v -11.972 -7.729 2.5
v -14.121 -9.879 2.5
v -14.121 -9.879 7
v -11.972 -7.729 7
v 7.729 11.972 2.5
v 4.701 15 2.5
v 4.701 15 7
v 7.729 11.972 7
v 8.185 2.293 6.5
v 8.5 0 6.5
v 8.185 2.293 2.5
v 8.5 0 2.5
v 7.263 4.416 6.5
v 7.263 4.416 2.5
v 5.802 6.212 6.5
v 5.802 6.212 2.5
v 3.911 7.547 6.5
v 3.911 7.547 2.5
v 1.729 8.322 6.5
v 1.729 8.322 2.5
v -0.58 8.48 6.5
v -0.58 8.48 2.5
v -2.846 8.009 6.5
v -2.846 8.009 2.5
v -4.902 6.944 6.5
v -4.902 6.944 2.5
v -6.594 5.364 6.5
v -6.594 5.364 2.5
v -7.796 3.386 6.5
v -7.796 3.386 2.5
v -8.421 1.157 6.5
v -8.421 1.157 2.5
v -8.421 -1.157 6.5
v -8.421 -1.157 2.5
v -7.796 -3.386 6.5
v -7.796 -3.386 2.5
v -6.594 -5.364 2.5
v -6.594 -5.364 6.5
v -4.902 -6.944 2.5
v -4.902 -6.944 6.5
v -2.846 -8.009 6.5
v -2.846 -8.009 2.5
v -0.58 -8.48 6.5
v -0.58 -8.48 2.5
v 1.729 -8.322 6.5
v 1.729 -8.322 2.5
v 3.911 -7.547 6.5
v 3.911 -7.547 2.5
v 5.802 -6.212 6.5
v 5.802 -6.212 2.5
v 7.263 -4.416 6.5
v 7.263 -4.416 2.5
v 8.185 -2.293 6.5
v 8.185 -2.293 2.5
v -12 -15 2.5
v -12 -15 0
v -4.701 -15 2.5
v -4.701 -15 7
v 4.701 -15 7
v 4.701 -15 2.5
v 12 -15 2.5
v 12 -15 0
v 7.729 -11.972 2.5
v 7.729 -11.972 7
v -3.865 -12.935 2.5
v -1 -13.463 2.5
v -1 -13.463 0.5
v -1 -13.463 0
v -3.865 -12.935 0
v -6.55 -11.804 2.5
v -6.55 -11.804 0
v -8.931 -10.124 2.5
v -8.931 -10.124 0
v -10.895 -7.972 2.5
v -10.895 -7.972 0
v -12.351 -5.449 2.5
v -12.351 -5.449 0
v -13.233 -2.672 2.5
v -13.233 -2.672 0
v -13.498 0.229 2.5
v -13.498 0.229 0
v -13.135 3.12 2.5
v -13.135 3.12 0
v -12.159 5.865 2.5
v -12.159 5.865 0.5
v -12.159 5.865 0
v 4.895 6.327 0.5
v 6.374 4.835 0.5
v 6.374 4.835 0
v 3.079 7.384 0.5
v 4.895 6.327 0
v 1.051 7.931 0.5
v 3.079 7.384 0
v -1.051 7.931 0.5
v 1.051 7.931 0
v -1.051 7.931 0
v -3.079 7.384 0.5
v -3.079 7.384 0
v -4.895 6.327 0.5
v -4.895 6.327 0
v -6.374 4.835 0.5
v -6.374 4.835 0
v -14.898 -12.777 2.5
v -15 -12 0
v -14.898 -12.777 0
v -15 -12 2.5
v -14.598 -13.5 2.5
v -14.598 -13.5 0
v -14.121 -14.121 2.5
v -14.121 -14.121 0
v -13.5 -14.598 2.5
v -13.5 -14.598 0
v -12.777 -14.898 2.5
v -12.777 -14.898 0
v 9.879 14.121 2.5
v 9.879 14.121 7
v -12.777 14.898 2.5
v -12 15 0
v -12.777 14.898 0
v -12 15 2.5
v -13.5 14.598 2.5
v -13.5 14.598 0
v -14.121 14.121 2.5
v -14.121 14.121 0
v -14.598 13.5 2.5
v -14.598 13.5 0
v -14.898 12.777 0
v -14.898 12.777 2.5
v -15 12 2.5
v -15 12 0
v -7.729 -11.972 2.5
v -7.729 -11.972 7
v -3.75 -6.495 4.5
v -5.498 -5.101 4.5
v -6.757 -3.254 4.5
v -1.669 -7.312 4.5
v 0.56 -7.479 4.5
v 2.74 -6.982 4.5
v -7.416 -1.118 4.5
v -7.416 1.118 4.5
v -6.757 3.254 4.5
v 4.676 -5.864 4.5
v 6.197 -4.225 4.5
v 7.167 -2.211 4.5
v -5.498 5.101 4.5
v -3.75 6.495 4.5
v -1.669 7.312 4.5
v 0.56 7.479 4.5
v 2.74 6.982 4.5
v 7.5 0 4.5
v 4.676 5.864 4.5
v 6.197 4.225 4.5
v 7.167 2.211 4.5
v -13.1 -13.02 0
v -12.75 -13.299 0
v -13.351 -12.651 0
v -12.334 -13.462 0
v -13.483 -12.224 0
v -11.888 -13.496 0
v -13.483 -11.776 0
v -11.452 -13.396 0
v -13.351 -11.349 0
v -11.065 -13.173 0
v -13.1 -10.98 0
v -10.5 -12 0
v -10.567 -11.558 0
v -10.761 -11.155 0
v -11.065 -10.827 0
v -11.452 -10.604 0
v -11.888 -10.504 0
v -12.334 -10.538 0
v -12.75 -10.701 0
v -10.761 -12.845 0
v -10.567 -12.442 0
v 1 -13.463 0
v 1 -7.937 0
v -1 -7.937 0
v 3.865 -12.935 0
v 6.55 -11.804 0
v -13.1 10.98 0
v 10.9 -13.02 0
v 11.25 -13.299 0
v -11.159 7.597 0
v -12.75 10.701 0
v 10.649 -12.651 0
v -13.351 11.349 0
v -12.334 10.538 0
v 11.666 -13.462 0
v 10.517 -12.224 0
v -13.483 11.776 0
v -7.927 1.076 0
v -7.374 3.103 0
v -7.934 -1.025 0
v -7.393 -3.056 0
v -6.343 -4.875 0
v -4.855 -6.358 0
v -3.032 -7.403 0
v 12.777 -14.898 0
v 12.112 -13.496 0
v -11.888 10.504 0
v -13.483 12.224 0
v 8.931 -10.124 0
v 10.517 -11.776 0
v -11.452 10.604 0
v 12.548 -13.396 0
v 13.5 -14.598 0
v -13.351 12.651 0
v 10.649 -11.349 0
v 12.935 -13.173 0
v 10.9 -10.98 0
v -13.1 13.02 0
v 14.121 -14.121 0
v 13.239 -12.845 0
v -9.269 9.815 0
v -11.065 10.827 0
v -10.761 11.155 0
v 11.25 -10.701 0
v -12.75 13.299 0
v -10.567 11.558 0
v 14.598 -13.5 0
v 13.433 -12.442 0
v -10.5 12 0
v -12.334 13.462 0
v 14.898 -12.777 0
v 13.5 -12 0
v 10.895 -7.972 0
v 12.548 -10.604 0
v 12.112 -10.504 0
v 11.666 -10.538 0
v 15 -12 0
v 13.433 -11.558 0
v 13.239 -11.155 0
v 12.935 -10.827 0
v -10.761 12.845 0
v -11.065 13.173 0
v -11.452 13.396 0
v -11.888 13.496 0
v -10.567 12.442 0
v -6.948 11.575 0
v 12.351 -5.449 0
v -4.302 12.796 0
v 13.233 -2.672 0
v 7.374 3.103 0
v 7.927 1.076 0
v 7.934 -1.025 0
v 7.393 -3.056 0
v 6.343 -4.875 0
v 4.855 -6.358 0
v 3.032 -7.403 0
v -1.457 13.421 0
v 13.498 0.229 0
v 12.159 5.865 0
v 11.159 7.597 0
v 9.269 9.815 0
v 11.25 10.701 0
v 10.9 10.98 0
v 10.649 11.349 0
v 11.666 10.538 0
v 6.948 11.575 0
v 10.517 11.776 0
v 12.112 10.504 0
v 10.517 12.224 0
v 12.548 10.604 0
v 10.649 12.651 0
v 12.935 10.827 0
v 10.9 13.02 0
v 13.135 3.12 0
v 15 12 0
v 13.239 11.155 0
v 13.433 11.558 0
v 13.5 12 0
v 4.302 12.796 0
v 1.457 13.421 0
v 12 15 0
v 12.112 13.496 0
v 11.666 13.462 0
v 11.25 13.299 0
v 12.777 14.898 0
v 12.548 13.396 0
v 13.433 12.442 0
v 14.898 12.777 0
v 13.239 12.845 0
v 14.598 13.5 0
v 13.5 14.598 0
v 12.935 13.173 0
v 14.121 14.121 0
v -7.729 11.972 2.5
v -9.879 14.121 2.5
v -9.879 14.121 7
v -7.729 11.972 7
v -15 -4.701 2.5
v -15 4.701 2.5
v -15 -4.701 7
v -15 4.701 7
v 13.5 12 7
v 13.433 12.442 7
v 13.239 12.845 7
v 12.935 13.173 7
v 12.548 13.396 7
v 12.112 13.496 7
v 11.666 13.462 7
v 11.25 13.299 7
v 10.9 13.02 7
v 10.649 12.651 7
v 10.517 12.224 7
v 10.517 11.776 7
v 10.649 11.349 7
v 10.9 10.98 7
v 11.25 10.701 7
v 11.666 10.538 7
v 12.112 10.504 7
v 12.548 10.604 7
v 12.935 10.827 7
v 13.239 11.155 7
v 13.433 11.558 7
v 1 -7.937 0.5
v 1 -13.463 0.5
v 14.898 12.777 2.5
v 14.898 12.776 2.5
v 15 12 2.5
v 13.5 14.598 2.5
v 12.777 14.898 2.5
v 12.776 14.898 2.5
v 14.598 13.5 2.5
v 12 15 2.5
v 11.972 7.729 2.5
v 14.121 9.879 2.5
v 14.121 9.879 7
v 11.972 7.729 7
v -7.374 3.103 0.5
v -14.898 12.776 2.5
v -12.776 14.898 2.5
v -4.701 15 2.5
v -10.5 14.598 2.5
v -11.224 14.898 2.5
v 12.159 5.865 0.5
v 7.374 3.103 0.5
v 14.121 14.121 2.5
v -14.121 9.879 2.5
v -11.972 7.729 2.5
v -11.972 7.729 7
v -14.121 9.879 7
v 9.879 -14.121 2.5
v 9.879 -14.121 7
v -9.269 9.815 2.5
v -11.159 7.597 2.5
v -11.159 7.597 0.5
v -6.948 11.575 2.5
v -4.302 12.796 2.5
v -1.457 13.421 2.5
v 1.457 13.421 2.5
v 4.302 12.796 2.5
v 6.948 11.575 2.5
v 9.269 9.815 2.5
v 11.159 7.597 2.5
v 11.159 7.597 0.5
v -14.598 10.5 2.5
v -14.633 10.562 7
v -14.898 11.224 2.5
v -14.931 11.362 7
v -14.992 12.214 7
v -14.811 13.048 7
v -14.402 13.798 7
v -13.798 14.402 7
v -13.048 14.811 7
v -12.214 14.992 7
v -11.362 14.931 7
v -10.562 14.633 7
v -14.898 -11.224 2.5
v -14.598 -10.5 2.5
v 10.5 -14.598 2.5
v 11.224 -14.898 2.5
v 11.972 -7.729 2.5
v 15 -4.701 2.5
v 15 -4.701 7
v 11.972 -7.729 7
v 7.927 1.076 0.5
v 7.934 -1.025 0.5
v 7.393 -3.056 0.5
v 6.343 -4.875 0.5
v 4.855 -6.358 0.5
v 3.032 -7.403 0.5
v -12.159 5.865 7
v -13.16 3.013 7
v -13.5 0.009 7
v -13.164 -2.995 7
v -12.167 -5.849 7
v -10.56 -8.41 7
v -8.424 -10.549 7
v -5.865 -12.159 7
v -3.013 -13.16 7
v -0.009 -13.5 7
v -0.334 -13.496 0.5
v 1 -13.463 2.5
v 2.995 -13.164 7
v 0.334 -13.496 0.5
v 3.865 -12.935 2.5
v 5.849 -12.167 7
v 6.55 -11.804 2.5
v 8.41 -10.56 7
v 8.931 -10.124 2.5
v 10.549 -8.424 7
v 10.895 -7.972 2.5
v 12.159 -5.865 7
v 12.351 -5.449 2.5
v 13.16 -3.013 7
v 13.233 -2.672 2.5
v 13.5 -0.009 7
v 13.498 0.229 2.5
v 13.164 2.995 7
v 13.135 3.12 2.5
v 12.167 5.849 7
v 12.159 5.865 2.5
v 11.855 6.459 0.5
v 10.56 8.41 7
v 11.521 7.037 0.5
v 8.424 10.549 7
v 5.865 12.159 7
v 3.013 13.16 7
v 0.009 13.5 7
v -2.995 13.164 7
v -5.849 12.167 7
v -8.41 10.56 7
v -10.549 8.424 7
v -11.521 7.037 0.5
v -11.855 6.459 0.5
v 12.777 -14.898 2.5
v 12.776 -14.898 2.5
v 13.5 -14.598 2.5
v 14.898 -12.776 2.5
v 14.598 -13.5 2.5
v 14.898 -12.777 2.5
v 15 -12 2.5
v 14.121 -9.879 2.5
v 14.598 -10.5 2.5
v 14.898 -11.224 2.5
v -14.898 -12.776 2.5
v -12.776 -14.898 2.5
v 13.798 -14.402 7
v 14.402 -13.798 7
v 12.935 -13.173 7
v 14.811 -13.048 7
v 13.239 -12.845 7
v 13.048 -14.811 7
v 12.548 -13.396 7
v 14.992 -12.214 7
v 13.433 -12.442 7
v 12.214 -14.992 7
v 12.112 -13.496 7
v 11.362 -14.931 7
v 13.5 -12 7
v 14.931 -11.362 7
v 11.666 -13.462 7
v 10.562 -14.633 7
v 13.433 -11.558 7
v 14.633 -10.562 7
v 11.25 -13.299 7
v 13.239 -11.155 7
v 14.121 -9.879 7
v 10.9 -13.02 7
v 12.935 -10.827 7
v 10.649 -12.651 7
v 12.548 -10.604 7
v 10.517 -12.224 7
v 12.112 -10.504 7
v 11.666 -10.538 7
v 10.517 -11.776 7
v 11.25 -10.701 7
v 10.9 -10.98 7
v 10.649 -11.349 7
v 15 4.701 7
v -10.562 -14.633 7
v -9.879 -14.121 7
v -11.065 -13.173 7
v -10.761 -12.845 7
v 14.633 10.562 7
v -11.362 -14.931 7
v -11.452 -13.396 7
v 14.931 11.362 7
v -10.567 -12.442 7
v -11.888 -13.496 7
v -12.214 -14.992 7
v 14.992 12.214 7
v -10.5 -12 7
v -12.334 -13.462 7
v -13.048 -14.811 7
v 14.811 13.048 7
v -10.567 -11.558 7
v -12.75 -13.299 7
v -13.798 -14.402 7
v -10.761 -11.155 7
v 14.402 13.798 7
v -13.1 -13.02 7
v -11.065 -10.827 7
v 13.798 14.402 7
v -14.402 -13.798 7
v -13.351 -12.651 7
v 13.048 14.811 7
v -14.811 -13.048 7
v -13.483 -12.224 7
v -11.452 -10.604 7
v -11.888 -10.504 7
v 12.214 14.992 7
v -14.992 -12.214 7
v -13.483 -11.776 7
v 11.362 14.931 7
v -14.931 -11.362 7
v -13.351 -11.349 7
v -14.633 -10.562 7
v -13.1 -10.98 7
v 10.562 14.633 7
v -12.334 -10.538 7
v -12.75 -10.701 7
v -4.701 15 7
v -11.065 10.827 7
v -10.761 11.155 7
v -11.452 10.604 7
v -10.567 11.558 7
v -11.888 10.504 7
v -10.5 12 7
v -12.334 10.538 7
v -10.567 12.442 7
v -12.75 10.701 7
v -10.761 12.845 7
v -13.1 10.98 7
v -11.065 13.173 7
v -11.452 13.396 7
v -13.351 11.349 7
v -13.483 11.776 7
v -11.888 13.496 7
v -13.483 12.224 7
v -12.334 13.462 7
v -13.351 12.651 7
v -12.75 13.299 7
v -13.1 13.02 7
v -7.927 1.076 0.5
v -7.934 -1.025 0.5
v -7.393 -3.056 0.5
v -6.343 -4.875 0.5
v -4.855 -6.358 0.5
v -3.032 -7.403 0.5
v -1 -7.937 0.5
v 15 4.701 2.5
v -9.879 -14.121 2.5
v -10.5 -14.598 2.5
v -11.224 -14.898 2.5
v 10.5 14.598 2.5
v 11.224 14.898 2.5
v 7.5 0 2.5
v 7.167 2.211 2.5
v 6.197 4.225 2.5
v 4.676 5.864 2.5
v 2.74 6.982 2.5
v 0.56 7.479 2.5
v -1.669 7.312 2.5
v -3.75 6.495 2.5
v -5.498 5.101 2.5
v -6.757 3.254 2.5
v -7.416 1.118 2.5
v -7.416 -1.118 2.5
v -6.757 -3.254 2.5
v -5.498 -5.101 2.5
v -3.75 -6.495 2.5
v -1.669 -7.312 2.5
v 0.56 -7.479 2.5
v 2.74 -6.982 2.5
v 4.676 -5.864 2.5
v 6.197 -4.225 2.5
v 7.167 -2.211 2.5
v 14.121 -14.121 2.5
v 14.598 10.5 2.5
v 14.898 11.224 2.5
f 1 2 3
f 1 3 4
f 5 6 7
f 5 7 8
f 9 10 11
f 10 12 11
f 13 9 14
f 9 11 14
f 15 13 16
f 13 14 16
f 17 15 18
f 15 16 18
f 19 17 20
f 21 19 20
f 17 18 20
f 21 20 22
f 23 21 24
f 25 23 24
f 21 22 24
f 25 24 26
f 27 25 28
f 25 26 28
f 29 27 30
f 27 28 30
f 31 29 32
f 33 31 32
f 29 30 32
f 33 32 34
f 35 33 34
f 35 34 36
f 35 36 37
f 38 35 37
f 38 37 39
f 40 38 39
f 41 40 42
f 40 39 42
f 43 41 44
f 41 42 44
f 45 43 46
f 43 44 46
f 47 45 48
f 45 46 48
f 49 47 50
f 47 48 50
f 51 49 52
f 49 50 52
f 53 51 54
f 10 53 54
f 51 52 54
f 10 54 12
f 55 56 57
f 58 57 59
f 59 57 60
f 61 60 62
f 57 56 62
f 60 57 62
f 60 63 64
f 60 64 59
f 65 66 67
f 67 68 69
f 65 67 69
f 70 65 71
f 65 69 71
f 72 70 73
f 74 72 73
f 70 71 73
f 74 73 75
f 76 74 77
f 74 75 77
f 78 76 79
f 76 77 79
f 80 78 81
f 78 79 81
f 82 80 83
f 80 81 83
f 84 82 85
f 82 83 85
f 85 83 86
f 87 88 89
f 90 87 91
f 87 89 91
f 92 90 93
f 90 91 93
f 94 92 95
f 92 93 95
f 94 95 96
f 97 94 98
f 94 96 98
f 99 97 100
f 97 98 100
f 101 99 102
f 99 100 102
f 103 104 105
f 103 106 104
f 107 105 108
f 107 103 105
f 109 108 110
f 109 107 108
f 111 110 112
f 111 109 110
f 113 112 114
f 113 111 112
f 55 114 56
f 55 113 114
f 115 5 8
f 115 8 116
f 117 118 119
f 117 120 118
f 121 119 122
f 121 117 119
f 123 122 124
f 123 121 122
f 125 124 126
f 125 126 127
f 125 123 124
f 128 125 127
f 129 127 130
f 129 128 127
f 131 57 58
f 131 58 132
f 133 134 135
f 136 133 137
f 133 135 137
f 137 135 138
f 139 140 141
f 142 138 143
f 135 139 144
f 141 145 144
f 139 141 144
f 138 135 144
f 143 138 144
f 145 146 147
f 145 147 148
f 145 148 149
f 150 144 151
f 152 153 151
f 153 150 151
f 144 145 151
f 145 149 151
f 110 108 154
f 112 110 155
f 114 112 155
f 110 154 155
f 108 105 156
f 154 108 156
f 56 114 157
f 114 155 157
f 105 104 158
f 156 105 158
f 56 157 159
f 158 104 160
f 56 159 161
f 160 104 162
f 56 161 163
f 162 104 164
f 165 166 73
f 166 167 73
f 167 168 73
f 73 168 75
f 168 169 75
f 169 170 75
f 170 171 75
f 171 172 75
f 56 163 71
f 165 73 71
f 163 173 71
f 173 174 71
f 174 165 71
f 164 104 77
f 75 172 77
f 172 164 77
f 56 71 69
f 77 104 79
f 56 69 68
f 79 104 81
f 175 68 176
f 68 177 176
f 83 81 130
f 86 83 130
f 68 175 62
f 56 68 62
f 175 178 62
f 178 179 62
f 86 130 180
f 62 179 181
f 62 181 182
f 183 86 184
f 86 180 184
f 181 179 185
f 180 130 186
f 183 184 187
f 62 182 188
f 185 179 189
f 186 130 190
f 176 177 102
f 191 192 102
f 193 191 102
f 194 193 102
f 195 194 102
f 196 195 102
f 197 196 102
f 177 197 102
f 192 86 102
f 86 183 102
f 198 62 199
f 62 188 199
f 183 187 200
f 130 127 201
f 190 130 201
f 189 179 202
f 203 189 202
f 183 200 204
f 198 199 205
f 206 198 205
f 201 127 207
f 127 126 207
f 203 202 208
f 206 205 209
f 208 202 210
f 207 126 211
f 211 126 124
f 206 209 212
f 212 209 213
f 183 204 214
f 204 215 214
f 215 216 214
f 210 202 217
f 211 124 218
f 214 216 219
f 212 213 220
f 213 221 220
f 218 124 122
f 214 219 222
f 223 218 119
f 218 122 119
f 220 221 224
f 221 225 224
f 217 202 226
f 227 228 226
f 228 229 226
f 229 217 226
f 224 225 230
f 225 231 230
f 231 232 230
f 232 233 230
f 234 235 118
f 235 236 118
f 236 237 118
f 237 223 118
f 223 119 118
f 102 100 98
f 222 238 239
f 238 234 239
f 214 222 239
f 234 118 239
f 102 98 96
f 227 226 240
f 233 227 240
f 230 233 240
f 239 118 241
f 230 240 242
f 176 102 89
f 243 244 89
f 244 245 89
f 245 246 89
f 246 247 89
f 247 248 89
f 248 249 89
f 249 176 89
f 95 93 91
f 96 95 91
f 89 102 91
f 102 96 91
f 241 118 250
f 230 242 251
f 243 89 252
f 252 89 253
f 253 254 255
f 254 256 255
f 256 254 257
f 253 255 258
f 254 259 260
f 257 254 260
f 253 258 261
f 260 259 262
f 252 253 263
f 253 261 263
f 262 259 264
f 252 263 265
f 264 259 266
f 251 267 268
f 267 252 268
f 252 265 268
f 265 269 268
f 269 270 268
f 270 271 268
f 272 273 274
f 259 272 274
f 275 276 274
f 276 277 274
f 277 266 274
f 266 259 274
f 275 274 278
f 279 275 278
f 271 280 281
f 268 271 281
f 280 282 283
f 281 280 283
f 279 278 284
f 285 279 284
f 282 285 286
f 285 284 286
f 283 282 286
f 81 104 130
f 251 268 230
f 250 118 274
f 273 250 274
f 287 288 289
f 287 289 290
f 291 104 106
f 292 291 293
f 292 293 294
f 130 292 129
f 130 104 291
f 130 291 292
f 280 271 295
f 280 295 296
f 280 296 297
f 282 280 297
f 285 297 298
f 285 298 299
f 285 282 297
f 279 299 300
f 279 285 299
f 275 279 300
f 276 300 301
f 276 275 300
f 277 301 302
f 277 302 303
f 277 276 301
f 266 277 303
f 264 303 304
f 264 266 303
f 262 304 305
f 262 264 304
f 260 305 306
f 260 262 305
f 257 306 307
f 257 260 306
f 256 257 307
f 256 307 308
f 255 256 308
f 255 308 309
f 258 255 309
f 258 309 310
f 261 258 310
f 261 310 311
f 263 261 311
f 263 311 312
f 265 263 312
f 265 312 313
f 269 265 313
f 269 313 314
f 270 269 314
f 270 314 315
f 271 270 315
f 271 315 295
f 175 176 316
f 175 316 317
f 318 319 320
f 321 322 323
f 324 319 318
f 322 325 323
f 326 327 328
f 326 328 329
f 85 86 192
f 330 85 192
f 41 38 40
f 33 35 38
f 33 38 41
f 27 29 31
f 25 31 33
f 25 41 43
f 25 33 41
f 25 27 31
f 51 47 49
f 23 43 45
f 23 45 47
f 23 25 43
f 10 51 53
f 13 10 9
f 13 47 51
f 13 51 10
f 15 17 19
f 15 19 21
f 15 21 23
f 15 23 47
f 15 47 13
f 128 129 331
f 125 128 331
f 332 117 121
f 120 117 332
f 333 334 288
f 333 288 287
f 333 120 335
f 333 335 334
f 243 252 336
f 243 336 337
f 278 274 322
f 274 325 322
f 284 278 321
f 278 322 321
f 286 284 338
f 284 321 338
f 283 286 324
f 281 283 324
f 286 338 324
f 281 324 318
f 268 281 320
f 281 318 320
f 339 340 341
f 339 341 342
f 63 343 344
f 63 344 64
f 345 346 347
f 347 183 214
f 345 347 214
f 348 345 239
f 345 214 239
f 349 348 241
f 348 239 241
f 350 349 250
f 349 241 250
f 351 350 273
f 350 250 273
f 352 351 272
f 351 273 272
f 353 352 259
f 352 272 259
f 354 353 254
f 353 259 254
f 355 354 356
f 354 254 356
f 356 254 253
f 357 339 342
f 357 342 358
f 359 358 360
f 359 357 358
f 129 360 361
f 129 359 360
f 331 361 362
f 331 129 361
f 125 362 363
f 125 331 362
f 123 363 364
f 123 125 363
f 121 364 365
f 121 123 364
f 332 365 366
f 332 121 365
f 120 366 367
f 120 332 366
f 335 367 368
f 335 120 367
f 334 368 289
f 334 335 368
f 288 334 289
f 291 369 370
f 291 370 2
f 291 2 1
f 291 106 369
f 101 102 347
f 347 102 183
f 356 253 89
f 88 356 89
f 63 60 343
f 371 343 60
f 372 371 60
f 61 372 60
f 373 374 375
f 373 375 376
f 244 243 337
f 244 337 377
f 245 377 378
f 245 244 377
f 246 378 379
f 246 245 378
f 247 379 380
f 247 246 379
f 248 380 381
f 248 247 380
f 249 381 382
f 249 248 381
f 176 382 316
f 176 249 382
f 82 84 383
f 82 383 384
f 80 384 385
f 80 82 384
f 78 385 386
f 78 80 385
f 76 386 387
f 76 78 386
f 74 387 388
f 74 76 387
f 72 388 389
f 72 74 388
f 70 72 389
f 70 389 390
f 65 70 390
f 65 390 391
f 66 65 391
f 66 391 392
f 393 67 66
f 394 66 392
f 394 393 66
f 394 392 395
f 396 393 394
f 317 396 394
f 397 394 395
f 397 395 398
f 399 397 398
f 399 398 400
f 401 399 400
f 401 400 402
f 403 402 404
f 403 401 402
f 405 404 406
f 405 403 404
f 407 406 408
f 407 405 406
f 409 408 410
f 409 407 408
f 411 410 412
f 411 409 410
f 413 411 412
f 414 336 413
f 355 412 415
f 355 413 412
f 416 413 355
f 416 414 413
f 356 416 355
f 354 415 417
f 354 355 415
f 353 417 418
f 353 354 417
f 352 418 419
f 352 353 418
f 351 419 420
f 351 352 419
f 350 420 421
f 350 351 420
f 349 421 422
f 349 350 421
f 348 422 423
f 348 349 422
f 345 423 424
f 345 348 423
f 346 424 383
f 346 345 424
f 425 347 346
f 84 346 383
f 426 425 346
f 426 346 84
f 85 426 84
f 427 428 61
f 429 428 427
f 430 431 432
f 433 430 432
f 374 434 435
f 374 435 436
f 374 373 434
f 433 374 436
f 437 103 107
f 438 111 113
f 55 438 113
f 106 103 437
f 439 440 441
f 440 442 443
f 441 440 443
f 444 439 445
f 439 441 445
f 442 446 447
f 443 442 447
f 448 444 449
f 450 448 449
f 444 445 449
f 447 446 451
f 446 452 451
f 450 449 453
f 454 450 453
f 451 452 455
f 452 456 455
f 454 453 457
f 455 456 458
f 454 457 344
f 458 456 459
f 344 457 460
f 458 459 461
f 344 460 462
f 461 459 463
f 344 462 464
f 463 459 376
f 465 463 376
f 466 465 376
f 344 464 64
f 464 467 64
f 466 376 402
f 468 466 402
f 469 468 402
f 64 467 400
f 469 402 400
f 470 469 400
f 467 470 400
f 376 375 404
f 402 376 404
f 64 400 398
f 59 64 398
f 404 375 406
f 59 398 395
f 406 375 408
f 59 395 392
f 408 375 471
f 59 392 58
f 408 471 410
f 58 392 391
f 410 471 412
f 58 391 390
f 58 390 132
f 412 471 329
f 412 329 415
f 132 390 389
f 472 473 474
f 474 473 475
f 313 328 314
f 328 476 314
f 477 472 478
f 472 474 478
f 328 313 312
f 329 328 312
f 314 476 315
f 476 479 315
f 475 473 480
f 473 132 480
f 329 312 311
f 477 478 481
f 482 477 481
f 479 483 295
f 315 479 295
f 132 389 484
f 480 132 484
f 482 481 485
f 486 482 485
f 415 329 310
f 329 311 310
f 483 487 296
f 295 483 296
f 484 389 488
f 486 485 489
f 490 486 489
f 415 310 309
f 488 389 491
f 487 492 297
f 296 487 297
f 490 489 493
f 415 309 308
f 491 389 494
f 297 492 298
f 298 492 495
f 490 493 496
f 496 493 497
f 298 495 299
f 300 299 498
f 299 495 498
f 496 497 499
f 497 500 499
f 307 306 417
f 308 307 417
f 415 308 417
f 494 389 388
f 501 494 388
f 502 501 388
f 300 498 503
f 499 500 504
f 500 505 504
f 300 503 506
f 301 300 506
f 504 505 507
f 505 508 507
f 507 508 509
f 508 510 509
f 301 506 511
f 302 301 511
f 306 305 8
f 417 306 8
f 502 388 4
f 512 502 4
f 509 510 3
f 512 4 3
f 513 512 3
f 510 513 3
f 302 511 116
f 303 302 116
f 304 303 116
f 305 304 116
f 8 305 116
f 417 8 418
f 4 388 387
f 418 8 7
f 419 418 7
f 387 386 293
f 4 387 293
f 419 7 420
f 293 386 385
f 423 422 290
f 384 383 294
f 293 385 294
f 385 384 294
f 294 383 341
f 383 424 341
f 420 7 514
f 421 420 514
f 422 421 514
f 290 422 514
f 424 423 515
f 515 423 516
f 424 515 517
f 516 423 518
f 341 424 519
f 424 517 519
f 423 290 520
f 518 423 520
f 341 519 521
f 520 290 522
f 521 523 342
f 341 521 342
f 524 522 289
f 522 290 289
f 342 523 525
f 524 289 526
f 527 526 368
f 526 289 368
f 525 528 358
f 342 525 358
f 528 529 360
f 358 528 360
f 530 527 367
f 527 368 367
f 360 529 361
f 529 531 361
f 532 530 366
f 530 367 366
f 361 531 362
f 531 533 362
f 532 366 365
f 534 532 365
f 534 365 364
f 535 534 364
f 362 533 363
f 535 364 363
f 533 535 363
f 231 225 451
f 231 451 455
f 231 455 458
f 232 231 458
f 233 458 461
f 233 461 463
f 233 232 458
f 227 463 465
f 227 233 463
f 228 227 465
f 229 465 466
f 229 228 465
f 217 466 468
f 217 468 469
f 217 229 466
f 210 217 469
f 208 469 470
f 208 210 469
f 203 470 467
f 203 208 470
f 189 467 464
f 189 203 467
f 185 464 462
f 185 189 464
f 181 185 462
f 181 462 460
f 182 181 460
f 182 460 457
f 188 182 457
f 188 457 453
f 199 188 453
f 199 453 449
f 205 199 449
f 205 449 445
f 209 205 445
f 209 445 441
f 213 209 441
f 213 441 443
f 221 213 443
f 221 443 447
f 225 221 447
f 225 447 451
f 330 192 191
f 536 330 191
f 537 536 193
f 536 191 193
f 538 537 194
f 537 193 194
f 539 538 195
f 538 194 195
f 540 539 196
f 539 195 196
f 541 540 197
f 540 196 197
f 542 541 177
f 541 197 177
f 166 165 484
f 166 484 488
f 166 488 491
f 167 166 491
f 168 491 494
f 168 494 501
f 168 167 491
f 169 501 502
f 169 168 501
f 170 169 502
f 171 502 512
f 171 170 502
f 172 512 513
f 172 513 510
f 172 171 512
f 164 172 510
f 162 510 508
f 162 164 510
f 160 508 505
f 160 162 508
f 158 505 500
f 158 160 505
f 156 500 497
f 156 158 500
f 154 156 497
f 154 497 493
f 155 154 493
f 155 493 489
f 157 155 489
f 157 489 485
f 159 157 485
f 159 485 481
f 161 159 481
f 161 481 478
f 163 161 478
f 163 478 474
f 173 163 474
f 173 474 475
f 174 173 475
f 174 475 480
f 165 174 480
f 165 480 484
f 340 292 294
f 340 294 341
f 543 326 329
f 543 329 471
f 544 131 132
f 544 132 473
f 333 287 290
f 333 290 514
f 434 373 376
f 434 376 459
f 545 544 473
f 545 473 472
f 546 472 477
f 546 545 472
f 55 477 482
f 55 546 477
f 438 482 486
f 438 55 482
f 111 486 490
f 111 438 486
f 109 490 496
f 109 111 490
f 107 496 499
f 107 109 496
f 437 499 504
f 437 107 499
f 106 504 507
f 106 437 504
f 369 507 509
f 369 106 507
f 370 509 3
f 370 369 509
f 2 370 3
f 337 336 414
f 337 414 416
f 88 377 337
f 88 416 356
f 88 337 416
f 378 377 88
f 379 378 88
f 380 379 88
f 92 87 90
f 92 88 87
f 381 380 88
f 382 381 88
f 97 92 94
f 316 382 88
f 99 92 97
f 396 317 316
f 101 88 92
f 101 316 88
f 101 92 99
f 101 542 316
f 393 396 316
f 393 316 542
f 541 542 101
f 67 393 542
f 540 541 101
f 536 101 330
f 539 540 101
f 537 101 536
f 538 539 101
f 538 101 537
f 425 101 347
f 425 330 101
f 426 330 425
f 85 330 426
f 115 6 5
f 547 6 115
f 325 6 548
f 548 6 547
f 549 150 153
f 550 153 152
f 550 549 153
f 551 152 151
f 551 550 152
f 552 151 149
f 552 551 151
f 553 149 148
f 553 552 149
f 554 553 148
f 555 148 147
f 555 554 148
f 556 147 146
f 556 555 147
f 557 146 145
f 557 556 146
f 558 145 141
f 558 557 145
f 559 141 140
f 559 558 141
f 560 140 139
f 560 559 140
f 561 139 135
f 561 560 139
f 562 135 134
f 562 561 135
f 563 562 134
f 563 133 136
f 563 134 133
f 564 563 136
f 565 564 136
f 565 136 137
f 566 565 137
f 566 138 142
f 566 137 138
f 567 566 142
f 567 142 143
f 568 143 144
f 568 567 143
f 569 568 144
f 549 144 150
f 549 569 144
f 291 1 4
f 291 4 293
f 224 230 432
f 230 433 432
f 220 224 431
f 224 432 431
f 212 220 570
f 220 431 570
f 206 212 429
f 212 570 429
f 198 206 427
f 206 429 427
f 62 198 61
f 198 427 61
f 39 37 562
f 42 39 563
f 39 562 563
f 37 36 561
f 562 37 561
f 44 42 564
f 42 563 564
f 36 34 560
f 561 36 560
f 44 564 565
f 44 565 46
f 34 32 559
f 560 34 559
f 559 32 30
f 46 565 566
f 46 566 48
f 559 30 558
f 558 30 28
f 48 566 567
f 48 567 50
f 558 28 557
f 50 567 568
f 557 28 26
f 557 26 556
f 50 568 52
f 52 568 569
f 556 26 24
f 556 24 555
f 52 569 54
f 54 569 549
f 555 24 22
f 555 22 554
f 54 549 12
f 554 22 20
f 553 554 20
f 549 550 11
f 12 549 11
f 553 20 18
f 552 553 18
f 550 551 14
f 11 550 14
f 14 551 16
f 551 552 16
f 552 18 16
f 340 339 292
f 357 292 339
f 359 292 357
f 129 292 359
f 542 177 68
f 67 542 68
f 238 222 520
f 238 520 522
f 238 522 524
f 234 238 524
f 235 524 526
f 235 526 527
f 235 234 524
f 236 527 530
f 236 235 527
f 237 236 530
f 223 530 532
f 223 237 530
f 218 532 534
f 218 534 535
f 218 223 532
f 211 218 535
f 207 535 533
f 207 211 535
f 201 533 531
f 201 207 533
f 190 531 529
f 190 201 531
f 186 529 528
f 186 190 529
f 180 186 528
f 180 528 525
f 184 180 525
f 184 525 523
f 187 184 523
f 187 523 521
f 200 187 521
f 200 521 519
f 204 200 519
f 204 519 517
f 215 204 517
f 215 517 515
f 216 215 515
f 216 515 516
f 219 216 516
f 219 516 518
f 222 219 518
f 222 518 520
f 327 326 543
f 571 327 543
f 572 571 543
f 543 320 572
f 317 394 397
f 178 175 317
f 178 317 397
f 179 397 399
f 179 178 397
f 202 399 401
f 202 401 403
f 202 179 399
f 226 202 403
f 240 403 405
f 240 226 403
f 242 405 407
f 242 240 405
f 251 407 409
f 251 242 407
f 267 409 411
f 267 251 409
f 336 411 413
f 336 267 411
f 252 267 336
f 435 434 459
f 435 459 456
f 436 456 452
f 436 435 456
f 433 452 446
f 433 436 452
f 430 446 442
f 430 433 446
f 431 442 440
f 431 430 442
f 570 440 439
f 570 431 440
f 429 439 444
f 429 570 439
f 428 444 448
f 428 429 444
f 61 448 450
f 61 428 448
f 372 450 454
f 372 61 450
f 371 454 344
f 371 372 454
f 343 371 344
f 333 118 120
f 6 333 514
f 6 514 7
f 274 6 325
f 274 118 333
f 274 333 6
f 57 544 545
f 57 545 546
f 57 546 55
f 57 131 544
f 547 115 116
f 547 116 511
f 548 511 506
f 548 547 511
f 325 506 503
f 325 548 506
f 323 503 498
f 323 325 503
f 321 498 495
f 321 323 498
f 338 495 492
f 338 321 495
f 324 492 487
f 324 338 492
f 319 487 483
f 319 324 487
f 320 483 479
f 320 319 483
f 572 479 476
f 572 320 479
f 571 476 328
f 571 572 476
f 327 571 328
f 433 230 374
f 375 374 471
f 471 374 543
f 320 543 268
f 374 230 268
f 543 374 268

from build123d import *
from build123d.topology import SkipClean

# Parameters (mm, degrees)
SKETCH_1_W          = 30
SKETCH_1_H          = 30
SKETCH_1_R          = 1.5
EXTRUDE_1_DEPTH     = 2.5
SKETCH_2_R          = 1.5
SKETCH_2_R_2        = 13.5
EXTRUDE_2_DEPTH     = 4.5
FILLET_2_R          = 3
CUT_EXTRUDE_START   = -2
SKETCH_3_R          = 13.5
CUT_EXTRUDE_1_DEPTH = 2
SKETCH_4_R          = 8.5
SKETCH_4_R_2        = 7.5
EXTRUDE_3_DEPTH     = 4
SKETCH_5_R          = 8.5
EXTRUDE_4_DEPTH     = 2


with BuildPart() as part:
    # Эскиз1 → Бобышка-Вытянуть1 (new body)
    with BuildSketch(Plane.XY):
        Rectangle(SKETCH_1_W, SKETCH_1_H)
        with Locations((-12, 12)):
            Circle(SKETCH_1_R, mode=Mode.SUBTRACT)
        with Locations((12, 12)):
            Circle(SKETCH_1_R, mode=Mode.SUBTRACT)
        with Locations((12, -12)):
            Circle(SKETCH_1_R, mode=Mode.SUBTRACT)
        with Locations((-12, -12)):
            Circle(SKETCH_1_R, mode=Mode.SUBTRACT)
        with BuildLine():
            Line((-1, -7.937253933), (-1, -13.462912018))
            ThreePointArc((-1, -13.462912018), (-11.691342951, -6.75), (-12.159223816, 5.865430605))
            Line((-12.159223816, 5.865430605), (-7.373863542, 3.102601563))
            ThreePointArc((-7.373863542, 3.102601563), (-6.92820323, -4), (-1, -7.937253933))
        make_face(mode=Mode.SUBTRACT)
        with BuildLine():
            Line((1, -7.937253933), (1, -13.462912018))
            ThreePointArc((1, -13.462912018), (11.691342951, -6.75), (12.159223816, 5.865430605))
            Line((12.159223816, 5.865430605), (7.373863542, 3.102601563))
            ThreePointArc((7.373863542, 3.102601563), (6.92820323, -4), (1, -7.937253933))
        make_face(mode=Mode.SUBTRACT)
        with BuildLine():
            Line((-6.373863542, 4.83465237), (-11.159223816, 7.597481413))
            ThreePointArc((-11.159223816, 7.597481413), (0, 13.5), (11.159223816, 7.597481413))
            Line((11.159223816, 7.597481413), (6.373863542, 4.83465237))
            ThreePointArc((6.373863542, 4.83465237), (0, 8), (-6.373863542, 4.83465237))
        make_face(mode=Mode.SUBTRACT)
    extrude(amount=EXTRUDE_1_DEPTH)

    # Эскиз2 → Бобышка-Вытянуть2 (add)
    with SkipClean():  # the faces are left unmerged after this step: merging them gives an invalid solid
        with BuildSketch(Plane.XY.offset(2.5)):
            with BuildLine():
                Line((-9.878679656, 14.121320344), (-7.729123809, 11.971764496))
                Line((-7.729123809, 11.971764496), (-4.700888305, 15))
                Line((-4.700888305, 15), (4.700888305, 15))
                Line((4.700888305, 15), (7.729123809, 11.971764496))
                Line((7.729123809, 11.971764496), (9.878679656, 14.121320344))
                ThreePointArc((9.878679656, 14.121320344), (14.121320344, 14.121320344), (14.121320344, 9.878679656))
                Line((14.121320344, 9.878679656), (11.971764496, 7.729123809))
                Line((11.971764496, 7.729123809), (15, 4.700888305))
                Line((15, 4.700888305), (15, -4.700888305))
                Line((15, -4.700888305), (11.971764496, -7.729123809))
                Line((11.971764496, -7.729123809), (14.121320344, -9.878679656))
                ThreePointArc((14.121320344, -9.878679656), (14.121320344, -14.121320344), (9.878679656, -14.121320344))
                Line((9.878679656, -14.121320344), (7.729123809, -11.971764496))
                Line((7.729123809, -11.971764496), (4.700888305, -15))
                Line((4.700888305, -15), (-4.700888305, -15))
                Line((-4.700888305, -15), (-7.729123809, -11.971764496))
                Line((-7.729123809, -11.971764496), (-9.878679656, -14.121320344))
                ThreePointArc((-9.878679656, -14.121320344), (-14.121320344, -14.121320344), (-14.121320344, -9.878679656))
                Line((-14.121320344, -9.878679656), (-11.971764496, -7.729123809))
                Line((-11.971764496, -7.729123809), (-15, -4.700888305))
                Line((-15, -4.700888305), (-15, 4.700888305))
                Line((-15, 4.700888305), (-11.971764496, 7.729123809))
                Line((-11.971764496, 7.729123809), (-14.121320344, 9.878679656))
                ThreePointArc((-14.121320344, 9.878679656), (-14.121320344, 14.121320344), (-9.878679656, 14.121320344))
            make_face()
            with Locations((-12, 12)):
                Circle(SKETCH_2_R, mode=Mode.SUBTRACT)
            with Locations((12, 12)):
                Circle(SKETCH_2_R, mode=Mode.SUBTRACT)
            with Locations((12, -12)):
                Circle(SKETCH_2_R, mode=Mode.SUBTRACT)
            with Locations((-12, -12)):
                Circle(SKETCH_2_R, mode=Mode.SUBTRACT)
            with Locations(Location((0, 0, 0), (0, 0, 154.248022667))):
                Circle(SKETCH_2_R_2, mode=Mode.SUBTRACT)
        extrude(amount=EXTRUDE_2_DEPTH)

    # Скругление2
    fillet_2_edges = [part.edges().sort_by_distance(p)[0] for p in [
        (-15, -15, 1.25),
        (15, -15, 1.25),
        (15, 15, 1.25),
        (-15, 15, 1.25),
    ]]
    fillet(fillet_2_edges, radius=FILLET_2_R - 0.0001)  # a hair under: the kernel refuses the full size

    # Эскиз3 → Вырез-Вытянуть1 (cut)
    with BuildSketch(Plane.XY.offset(2.5).offset(CUT_EXTRUDE_START)):
        with Locations(Location((0, 0, 0), (0, 0, 154.248022667))):
            Circle(SKETCH_3_R)
    extrude(amount=CUT_EXTRUDE_1_DEPTH, mode=Mode.SUBTRACT)


with BuildPart() as body_2:
    # Эскиз4 → Бобышка-Вытянуть3 (new body)
    with BuildSketch(Plane.XY.offset(2.5)):
        Circle(SKETCH_4_R)
        Circle(SKETCH_4_R_2, mode=Mode.SUBTRACT)
    extrude(amount=EXTRUDE_3_DEPTH)

    # Эскиз5 → Бобышка-Вытянуть4 (add)
    with BuildSketch(Plane.XY.offset(6.5)):
        Circle(SKETCH_5_R)
    extrude(amount=-EXTRUDE_4_DEPTH)


solid = Compound([part.part, body_2.part])
